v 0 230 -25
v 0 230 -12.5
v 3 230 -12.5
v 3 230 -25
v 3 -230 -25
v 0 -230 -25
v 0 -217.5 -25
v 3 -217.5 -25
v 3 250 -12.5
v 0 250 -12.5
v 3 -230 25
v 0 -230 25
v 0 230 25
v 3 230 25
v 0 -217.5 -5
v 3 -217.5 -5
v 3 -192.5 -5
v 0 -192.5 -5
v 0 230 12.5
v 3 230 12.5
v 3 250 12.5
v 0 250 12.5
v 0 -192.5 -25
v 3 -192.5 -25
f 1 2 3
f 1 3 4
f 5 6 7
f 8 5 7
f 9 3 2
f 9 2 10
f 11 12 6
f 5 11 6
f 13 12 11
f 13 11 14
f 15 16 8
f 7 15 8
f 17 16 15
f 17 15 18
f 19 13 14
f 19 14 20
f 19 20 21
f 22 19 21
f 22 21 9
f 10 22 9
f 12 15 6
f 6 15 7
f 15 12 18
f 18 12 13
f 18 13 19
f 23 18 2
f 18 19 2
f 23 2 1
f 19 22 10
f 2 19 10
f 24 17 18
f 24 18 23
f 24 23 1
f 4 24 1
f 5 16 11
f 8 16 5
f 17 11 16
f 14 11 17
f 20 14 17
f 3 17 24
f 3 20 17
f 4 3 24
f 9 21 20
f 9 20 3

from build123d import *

# Parameters (mm, degrees)
ESQUISSE1_W             = 50
ESQUISSE1_H             = 460
BOSS_EXTRU_1_DEPTH      = 3
ESQUISSE2_W             = 20
ESQUISSE2_H             = 25
ENL_V_MAT_EXTRU_2_DEPTH = 232.37415586
ESQUISSE5_W             = 25
ESQUISSE5_H             = 20
BOSS_EXTRU_3_DEPTH      = 3


with BuildPart() as part:
    # Esquisse1 → Boss.-Extru.1 (new body)
    with BuildSketch(Plane(origin=(0, 0, 0), x_dir=(0, 0, -1), z_dir=(1, 0, 0))):
        Rectangle(ESQUISSE1_W, ESQUISSE1_H)
    extrude(amount=BOSS_EXTRU_1_DEPTH)

    # Esquisse2 → Enlèv. mat.-Extru.2 (cut, through all)
    with BuildSketch(Plane(origin=(3, 0, 0), x_dir=(0, 0, -1), z_dir=(1, 0, 0))):
        with Locations((15, -205)):
            Rectangle(ESQUISSE2_W, ESQUISSE2_H)
    extrude(amount=-ENL_V_MAT_EXTRU_2_DEPTH, mode=Mode.SUBTRACT)

    # Esquisse5 → Boss.-Extru.3 (add)
    with BuildSketch(Plane(origin=(3, 0, 0), x_dir=(0, 0, -1), z_dir=(1, 0, 0))):
        with Locations((0, 240)):
            Rectangle(ESQUISSE5_W, ESQUISSE5_H)
    extrude(amount=-BOSS_EXTRU_3_DEPTH)


solid = part.part
